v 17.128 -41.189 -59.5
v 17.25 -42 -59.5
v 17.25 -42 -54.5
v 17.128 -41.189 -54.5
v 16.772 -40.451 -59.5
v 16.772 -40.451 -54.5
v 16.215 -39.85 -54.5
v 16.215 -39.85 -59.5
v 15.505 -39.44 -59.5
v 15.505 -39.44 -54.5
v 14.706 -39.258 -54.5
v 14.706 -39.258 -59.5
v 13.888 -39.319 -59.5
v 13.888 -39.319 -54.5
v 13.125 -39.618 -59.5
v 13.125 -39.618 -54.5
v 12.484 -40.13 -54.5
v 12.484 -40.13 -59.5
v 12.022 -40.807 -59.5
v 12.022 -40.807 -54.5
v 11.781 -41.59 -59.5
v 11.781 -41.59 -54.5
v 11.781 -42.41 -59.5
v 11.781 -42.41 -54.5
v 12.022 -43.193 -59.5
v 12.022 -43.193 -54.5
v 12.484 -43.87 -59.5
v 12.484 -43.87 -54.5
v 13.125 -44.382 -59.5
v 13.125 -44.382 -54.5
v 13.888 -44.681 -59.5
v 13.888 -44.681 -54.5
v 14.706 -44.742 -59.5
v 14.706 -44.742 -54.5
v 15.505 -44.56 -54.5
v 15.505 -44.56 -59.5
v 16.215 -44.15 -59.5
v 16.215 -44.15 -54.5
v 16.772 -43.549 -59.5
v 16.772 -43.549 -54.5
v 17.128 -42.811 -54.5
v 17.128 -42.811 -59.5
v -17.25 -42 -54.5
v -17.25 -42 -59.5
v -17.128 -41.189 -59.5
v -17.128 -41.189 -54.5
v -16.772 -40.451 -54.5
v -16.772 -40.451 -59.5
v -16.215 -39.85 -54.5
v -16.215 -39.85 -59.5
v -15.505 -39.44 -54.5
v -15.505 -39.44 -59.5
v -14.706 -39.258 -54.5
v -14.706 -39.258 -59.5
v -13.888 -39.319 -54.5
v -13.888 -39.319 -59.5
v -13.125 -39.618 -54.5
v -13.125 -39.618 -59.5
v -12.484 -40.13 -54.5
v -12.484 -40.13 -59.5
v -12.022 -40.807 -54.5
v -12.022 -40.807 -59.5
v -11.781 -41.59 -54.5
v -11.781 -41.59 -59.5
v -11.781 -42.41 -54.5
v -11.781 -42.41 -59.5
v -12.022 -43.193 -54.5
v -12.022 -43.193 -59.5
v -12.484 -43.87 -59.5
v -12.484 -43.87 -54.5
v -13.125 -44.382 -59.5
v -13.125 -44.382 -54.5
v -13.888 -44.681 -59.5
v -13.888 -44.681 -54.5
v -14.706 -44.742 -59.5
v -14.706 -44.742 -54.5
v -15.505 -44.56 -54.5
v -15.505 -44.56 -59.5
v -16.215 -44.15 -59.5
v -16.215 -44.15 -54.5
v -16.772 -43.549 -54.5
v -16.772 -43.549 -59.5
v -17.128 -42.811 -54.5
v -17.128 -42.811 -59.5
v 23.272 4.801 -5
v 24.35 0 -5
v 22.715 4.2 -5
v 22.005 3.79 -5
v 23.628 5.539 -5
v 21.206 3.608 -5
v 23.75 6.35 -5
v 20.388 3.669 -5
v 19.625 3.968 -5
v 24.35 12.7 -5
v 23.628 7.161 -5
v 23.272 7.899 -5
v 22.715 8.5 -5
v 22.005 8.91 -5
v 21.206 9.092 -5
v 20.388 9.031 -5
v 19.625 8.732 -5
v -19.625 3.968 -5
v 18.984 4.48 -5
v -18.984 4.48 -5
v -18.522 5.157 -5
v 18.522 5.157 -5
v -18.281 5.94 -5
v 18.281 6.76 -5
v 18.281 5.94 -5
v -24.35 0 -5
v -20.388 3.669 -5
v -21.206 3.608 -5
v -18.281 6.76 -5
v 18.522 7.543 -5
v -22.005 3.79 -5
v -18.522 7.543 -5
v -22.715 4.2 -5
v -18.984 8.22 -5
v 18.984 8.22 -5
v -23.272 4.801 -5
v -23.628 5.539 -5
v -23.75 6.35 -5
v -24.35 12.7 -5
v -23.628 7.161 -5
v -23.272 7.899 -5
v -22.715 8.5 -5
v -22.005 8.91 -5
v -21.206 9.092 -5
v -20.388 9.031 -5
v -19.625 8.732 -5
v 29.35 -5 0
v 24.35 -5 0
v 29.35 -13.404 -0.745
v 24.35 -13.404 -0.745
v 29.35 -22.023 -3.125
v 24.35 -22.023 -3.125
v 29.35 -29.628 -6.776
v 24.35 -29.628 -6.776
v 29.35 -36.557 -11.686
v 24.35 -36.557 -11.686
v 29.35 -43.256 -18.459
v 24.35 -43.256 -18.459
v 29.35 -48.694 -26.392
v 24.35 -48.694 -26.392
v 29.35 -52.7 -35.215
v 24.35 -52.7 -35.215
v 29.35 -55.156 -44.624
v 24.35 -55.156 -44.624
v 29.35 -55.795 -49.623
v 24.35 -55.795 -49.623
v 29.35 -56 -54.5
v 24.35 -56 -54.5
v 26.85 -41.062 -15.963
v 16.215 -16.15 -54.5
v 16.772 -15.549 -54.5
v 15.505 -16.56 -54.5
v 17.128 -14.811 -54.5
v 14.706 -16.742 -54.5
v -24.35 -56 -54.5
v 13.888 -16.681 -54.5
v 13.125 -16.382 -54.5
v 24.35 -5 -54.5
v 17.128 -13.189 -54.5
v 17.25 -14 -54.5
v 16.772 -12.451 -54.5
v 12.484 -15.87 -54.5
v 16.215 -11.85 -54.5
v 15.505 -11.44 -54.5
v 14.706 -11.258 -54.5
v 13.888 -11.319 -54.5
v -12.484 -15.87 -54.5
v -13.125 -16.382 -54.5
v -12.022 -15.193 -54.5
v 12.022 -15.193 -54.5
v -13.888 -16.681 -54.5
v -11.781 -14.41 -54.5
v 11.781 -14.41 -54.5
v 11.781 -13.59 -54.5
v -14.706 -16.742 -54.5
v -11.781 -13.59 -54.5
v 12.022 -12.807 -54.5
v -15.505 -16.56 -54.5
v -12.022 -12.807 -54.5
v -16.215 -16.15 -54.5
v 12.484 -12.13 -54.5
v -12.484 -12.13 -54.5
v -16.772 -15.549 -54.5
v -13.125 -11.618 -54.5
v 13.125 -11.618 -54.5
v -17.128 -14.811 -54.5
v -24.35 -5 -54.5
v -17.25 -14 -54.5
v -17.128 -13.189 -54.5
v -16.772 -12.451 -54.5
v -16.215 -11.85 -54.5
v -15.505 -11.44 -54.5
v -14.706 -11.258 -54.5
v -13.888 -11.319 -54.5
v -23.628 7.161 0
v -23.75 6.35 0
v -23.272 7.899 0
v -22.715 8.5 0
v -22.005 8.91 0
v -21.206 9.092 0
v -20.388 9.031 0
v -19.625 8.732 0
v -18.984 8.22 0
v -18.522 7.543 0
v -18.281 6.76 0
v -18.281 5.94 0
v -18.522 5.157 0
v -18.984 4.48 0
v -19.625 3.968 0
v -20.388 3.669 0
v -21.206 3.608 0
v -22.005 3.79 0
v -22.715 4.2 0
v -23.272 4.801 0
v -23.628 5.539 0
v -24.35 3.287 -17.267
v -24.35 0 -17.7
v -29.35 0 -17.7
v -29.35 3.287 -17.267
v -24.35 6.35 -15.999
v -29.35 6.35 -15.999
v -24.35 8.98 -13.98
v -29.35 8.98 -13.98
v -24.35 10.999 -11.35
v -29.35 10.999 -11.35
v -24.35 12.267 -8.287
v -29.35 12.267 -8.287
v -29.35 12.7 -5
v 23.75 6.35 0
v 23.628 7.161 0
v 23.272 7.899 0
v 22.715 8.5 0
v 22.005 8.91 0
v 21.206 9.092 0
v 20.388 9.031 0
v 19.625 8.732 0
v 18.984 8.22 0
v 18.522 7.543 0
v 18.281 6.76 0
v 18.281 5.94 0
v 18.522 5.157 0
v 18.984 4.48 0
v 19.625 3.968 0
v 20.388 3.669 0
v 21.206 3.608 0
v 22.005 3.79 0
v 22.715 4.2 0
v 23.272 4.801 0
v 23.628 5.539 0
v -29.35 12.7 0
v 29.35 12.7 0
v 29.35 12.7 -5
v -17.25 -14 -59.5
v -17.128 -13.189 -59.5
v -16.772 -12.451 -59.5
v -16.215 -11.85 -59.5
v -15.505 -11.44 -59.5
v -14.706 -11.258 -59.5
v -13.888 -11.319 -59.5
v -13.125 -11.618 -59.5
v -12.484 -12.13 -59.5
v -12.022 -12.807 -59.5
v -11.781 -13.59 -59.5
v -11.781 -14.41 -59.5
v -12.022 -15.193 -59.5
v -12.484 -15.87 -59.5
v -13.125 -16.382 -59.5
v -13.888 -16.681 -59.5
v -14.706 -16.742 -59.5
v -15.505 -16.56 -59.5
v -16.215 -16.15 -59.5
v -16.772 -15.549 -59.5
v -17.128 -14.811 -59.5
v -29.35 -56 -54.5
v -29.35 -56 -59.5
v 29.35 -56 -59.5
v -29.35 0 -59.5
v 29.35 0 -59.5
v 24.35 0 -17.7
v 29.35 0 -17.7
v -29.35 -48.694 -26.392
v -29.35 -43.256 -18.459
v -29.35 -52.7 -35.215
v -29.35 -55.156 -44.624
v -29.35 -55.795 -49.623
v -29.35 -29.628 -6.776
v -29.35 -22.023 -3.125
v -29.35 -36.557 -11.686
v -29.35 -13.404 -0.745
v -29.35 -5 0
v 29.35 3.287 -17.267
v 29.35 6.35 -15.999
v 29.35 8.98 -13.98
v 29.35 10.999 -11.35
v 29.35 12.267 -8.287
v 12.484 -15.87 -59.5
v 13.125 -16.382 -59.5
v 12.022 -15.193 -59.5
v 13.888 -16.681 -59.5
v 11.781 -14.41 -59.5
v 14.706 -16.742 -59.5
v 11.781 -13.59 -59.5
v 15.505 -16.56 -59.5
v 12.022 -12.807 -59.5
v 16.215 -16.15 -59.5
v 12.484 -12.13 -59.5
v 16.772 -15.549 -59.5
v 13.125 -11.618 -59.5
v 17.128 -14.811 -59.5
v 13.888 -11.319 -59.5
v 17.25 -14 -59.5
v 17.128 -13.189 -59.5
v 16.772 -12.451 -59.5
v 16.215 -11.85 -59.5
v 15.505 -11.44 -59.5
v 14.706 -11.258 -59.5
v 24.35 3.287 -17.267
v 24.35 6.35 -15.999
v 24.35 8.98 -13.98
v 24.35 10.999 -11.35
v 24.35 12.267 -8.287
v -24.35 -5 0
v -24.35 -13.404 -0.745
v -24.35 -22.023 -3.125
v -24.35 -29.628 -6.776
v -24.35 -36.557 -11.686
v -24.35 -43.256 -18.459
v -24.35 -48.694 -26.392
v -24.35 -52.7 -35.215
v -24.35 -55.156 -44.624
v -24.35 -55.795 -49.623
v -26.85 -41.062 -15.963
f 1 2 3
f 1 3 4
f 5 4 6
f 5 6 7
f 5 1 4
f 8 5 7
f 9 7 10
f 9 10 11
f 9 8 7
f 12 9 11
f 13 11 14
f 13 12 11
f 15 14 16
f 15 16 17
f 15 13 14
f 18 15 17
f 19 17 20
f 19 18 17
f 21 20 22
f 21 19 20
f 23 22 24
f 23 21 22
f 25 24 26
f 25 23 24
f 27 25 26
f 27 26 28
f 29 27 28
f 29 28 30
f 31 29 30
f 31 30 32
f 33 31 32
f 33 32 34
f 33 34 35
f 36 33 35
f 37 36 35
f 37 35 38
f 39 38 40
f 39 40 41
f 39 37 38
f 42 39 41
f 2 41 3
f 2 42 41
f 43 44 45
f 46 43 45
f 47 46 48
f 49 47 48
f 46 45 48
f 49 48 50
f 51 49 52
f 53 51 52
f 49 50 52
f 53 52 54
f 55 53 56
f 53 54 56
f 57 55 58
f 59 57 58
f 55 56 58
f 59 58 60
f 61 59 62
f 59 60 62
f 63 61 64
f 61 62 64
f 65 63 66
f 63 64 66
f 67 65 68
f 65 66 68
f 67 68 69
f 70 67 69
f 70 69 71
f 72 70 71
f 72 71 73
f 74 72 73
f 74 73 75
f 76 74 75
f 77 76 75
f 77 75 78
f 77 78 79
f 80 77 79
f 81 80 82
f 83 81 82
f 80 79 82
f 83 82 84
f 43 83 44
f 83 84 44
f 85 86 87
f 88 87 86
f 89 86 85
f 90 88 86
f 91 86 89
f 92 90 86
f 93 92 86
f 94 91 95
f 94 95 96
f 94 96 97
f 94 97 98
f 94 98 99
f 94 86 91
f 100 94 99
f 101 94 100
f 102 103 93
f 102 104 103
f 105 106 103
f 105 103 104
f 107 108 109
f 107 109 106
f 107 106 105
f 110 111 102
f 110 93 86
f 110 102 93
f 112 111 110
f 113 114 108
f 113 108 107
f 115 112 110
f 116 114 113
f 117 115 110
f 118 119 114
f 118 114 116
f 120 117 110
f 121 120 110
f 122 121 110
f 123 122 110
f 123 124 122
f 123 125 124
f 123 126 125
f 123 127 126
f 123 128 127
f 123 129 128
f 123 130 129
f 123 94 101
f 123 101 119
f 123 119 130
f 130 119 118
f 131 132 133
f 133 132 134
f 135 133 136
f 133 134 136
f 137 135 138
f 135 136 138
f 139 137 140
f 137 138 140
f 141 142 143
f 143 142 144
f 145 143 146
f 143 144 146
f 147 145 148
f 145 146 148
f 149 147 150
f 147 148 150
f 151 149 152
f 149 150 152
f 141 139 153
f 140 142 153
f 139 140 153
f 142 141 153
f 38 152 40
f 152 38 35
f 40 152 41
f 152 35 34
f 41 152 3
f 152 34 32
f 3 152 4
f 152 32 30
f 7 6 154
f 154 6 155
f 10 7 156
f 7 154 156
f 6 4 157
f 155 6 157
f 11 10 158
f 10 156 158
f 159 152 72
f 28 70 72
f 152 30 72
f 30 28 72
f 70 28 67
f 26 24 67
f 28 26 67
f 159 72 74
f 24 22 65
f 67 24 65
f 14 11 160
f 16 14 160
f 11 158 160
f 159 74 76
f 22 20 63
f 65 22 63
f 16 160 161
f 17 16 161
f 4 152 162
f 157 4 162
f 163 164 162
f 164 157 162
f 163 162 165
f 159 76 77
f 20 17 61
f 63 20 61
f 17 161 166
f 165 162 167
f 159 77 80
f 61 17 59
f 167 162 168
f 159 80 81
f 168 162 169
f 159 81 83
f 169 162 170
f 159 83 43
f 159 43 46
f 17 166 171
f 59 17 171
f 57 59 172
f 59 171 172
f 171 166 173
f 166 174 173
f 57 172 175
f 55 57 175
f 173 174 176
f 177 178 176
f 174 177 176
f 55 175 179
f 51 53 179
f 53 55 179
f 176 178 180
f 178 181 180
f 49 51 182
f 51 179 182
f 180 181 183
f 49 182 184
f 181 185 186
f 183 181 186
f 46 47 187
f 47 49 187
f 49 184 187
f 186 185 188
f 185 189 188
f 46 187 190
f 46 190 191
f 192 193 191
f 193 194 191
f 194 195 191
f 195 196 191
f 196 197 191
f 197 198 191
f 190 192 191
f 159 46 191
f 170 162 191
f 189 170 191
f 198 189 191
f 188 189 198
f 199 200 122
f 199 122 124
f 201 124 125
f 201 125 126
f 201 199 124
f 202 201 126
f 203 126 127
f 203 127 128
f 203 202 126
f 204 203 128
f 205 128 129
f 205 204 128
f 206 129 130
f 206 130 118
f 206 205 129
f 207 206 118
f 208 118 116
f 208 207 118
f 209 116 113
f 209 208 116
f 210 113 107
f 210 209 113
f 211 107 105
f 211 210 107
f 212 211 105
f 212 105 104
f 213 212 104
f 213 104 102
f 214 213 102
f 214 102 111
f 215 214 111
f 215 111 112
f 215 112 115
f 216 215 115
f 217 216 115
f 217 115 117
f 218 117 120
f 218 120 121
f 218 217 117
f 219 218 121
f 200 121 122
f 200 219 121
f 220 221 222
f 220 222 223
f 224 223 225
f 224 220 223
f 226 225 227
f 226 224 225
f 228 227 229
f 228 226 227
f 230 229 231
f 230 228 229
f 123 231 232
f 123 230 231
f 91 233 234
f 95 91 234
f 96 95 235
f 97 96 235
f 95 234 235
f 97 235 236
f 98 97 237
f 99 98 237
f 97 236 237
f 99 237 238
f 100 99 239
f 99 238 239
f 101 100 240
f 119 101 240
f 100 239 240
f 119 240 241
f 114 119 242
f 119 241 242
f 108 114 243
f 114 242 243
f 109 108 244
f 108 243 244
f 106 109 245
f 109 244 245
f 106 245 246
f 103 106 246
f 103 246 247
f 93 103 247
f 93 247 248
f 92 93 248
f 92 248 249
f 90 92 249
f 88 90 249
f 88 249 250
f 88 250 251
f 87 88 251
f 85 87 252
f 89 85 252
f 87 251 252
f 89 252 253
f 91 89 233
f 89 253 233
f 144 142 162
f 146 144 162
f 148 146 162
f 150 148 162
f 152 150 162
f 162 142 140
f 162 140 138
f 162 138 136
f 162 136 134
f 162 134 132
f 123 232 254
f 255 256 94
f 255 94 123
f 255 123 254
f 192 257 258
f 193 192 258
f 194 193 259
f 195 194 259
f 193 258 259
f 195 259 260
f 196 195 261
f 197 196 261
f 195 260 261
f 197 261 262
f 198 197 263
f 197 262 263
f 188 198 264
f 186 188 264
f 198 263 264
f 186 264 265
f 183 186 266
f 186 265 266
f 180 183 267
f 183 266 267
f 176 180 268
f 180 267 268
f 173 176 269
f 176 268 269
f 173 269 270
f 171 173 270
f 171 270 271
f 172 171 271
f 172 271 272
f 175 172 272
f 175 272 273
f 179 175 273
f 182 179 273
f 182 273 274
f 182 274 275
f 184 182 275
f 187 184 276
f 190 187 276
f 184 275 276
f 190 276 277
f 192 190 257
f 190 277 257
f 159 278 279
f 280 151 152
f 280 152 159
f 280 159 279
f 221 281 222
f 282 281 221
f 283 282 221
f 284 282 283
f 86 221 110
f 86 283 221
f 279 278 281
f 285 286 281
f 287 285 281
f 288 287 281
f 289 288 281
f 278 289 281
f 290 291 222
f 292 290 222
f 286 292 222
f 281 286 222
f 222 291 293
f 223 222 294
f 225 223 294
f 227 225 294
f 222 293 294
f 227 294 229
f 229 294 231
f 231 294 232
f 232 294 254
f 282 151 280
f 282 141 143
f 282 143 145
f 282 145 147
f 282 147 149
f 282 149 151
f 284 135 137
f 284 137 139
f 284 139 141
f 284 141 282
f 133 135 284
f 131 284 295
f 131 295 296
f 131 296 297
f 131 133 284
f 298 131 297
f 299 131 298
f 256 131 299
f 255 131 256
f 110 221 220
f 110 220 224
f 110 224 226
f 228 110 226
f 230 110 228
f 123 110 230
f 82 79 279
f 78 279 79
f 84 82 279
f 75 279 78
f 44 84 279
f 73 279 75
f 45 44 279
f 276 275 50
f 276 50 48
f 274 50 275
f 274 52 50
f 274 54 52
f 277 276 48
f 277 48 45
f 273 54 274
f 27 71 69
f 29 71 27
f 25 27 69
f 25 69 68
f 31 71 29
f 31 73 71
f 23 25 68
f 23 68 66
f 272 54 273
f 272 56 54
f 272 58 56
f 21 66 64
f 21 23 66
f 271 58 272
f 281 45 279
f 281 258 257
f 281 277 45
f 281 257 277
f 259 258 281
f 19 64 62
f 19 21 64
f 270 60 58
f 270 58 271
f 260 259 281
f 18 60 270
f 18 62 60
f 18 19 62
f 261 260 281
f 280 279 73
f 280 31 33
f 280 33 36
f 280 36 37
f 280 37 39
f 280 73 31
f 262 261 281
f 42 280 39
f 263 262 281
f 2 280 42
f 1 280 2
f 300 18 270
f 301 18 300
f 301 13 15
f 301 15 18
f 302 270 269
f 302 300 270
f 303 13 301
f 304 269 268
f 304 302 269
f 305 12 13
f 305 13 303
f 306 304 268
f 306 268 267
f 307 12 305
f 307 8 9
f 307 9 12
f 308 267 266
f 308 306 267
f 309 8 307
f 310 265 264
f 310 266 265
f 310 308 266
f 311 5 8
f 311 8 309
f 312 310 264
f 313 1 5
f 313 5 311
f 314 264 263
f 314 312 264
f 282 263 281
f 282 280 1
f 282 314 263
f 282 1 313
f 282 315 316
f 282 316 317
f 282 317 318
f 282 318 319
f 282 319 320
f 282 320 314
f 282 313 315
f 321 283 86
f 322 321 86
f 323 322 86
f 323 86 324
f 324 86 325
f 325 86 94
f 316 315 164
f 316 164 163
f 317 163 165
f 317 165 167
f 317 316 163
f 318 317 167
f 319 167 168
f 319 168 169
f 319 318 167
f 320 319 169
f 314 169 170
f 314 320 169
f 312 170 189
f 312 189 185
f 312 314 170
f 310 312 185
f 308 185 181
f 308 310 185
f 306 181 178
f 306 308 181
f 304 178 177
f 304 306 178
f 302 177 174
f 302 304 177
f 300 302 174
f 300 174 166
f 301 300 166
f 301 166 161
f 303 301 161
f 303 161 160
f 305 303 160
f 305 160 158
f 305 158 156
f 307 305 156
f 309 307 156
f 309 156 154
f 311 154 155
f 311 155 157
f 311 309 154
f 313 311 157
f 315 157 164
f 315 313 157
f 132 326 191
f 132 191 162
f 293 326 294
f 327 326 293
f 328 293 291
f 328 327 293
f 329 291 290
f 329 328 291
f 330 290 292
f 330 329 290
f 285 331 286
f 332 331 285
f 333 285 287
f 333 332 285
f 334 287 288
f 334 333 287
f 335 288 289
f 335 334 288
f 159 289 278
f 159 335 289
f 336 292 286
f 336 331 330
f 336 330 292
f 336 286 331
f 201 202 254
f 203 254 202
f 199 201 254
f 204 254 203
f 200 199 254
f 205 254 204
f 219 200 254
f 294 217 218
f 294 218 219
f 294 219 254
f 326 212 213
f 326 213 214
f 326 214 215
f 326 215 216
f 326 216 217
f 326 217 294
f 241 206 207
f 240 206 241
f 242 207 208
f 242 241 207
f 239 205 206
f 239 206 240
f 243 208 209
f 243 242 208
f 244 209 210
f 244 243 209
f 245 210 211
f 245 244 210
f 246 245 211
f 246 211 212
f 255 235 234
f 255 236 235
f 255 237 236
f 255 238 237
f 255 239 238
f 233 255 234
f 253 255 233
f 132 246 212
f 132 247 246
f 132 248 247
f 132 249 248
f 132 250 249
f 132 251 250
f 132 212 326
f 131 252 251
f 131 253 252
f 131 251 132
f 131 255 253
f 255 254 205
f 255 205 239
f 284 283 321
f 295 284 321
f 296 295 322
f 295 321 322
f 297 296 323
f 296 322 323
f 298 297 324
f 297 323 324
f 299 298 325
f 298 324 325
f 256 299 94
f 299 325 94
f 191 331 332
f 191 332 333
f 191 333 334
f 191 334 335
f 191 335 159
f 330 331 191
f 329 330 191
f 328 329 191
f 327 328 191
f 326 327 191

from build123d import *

# Parameters (mm, degrees)
SKETCH013_W  = 27.35
SKETCH013_H  = 12.7
SKETCH013_R  = 2.75
PAD012_DEPTH = 5
PAD013_DEPTH = 5
SKETCH014_W  = 29
SKETCH014_H  = 56
SKETCH014_R  = 2.75
PAD014_DEPTH = 5
PAD015_DEPTH = 5


with BuildPart() as part:
    # Sketch013 → Pad012 (new body)
    with BuildSketch(Plane.XY):
        with Locations((13.675, 6.35)):
            Rectangle(SKETCH013_W, SKETCH013_H)
        with Locations((21, 6.35)):
            Circle(SKETCH013_R, mode=Mode.SUBTRACT)
    pad012 = extrude(amount=-PAD012_DEPTH)

    # Sketch015 → Pad013 (join)
    with BuildSketch(Plane.XZ):
        with BuildLine():
            Line((27.35, 0), (27.35, -40.764007))
            ThreePointArc((27.35, -40.764007), (27.556989, -44.222692), (28.175, -47.632004))
            ThreePointArc((29, -54.5), (28.793011, -51.041315), (28.175, -47.632004))
            Line((29, -59.5), (29, -54.5))
            Line((0, -59.5), (29, -59.5))
            Line((0, 0), (0, -59.5))
            Line((27.35, 0), (0, 0))
        make_face()
    pad013 = extrude(amount=PAD013_DEPTH)

    # Sketch014 → Pad014 (join)
    with BuildSketch(Plane(origin=(0, -56, -59.5), x_dir=(1, 0, 0), z_dir=(0, 0, 1))):
        with Locations((14.5, 28)):
            Rectangle(SKETCH014_W, SKETCH014_H)
        with Locations((14.5, 14)):
            Circle(SKETCH014_R, mode=Mode.SUBTRACT)
        with Locations((14.5, 42)):
            Circle(SKETCH014_R, mode=Mode.SUBTRACT)
    pad014 = extrude(amount=PAD014_DEPTH)

    # Sketch016 → Pad015 (join)
    with BuildSketch(Plane.YZ.offset(24.35)):
        with BuildLine():
            Line((-56, -54.5), (-56, -59.5))
            Line((-56, -59.5), (0, -59.5))
            Line((0, -59.5), (0, -17.7))
            ThreePointArc((0, -17.7), (8.980256, -13.980256), (12.7, -5))
            Line((12.7, -5), (12.7, 0))
            Line((12.7, 0), (0, 0))
            Line((0, 0), (-5, 0))
            add(Edge.make_bspline(
                [(-5, 0), (-56, 0), (-56, -54.5)],
                knots=[0, 0, 0, 1.570796, 1.570796, 1.570796], degree=2, weights=[1, 0.707107, 1]))
        make_face()
    pad015 = extrude(amount=PAD015_DEPTH)

    # Mirrored013: Pad012, Pad013, Pad014, Pad015 across Sketch013 V_Axis
    add(pad012.mirror(Plane(origin=(0, 0, 0), x_dir=(0, 0, 1), z_dir=(1, 0, 0))))
    add(pad013.mirror(Plane(origin=(0, 0, 0), x_dir=(0, 0, 1), z_dir=(1, 0, 0))))
    add(pad014.mirror(Plane(origin=(0, 0, 0), x_dir=(0, 0, 1), z_dir=(1, 0, 0))))
    add(pad015.mirror(Plane(origin=(0, 0, 0), x_dir=(0, 0, 1), z_dir=(1, 0, 0))))


solid = part.part
